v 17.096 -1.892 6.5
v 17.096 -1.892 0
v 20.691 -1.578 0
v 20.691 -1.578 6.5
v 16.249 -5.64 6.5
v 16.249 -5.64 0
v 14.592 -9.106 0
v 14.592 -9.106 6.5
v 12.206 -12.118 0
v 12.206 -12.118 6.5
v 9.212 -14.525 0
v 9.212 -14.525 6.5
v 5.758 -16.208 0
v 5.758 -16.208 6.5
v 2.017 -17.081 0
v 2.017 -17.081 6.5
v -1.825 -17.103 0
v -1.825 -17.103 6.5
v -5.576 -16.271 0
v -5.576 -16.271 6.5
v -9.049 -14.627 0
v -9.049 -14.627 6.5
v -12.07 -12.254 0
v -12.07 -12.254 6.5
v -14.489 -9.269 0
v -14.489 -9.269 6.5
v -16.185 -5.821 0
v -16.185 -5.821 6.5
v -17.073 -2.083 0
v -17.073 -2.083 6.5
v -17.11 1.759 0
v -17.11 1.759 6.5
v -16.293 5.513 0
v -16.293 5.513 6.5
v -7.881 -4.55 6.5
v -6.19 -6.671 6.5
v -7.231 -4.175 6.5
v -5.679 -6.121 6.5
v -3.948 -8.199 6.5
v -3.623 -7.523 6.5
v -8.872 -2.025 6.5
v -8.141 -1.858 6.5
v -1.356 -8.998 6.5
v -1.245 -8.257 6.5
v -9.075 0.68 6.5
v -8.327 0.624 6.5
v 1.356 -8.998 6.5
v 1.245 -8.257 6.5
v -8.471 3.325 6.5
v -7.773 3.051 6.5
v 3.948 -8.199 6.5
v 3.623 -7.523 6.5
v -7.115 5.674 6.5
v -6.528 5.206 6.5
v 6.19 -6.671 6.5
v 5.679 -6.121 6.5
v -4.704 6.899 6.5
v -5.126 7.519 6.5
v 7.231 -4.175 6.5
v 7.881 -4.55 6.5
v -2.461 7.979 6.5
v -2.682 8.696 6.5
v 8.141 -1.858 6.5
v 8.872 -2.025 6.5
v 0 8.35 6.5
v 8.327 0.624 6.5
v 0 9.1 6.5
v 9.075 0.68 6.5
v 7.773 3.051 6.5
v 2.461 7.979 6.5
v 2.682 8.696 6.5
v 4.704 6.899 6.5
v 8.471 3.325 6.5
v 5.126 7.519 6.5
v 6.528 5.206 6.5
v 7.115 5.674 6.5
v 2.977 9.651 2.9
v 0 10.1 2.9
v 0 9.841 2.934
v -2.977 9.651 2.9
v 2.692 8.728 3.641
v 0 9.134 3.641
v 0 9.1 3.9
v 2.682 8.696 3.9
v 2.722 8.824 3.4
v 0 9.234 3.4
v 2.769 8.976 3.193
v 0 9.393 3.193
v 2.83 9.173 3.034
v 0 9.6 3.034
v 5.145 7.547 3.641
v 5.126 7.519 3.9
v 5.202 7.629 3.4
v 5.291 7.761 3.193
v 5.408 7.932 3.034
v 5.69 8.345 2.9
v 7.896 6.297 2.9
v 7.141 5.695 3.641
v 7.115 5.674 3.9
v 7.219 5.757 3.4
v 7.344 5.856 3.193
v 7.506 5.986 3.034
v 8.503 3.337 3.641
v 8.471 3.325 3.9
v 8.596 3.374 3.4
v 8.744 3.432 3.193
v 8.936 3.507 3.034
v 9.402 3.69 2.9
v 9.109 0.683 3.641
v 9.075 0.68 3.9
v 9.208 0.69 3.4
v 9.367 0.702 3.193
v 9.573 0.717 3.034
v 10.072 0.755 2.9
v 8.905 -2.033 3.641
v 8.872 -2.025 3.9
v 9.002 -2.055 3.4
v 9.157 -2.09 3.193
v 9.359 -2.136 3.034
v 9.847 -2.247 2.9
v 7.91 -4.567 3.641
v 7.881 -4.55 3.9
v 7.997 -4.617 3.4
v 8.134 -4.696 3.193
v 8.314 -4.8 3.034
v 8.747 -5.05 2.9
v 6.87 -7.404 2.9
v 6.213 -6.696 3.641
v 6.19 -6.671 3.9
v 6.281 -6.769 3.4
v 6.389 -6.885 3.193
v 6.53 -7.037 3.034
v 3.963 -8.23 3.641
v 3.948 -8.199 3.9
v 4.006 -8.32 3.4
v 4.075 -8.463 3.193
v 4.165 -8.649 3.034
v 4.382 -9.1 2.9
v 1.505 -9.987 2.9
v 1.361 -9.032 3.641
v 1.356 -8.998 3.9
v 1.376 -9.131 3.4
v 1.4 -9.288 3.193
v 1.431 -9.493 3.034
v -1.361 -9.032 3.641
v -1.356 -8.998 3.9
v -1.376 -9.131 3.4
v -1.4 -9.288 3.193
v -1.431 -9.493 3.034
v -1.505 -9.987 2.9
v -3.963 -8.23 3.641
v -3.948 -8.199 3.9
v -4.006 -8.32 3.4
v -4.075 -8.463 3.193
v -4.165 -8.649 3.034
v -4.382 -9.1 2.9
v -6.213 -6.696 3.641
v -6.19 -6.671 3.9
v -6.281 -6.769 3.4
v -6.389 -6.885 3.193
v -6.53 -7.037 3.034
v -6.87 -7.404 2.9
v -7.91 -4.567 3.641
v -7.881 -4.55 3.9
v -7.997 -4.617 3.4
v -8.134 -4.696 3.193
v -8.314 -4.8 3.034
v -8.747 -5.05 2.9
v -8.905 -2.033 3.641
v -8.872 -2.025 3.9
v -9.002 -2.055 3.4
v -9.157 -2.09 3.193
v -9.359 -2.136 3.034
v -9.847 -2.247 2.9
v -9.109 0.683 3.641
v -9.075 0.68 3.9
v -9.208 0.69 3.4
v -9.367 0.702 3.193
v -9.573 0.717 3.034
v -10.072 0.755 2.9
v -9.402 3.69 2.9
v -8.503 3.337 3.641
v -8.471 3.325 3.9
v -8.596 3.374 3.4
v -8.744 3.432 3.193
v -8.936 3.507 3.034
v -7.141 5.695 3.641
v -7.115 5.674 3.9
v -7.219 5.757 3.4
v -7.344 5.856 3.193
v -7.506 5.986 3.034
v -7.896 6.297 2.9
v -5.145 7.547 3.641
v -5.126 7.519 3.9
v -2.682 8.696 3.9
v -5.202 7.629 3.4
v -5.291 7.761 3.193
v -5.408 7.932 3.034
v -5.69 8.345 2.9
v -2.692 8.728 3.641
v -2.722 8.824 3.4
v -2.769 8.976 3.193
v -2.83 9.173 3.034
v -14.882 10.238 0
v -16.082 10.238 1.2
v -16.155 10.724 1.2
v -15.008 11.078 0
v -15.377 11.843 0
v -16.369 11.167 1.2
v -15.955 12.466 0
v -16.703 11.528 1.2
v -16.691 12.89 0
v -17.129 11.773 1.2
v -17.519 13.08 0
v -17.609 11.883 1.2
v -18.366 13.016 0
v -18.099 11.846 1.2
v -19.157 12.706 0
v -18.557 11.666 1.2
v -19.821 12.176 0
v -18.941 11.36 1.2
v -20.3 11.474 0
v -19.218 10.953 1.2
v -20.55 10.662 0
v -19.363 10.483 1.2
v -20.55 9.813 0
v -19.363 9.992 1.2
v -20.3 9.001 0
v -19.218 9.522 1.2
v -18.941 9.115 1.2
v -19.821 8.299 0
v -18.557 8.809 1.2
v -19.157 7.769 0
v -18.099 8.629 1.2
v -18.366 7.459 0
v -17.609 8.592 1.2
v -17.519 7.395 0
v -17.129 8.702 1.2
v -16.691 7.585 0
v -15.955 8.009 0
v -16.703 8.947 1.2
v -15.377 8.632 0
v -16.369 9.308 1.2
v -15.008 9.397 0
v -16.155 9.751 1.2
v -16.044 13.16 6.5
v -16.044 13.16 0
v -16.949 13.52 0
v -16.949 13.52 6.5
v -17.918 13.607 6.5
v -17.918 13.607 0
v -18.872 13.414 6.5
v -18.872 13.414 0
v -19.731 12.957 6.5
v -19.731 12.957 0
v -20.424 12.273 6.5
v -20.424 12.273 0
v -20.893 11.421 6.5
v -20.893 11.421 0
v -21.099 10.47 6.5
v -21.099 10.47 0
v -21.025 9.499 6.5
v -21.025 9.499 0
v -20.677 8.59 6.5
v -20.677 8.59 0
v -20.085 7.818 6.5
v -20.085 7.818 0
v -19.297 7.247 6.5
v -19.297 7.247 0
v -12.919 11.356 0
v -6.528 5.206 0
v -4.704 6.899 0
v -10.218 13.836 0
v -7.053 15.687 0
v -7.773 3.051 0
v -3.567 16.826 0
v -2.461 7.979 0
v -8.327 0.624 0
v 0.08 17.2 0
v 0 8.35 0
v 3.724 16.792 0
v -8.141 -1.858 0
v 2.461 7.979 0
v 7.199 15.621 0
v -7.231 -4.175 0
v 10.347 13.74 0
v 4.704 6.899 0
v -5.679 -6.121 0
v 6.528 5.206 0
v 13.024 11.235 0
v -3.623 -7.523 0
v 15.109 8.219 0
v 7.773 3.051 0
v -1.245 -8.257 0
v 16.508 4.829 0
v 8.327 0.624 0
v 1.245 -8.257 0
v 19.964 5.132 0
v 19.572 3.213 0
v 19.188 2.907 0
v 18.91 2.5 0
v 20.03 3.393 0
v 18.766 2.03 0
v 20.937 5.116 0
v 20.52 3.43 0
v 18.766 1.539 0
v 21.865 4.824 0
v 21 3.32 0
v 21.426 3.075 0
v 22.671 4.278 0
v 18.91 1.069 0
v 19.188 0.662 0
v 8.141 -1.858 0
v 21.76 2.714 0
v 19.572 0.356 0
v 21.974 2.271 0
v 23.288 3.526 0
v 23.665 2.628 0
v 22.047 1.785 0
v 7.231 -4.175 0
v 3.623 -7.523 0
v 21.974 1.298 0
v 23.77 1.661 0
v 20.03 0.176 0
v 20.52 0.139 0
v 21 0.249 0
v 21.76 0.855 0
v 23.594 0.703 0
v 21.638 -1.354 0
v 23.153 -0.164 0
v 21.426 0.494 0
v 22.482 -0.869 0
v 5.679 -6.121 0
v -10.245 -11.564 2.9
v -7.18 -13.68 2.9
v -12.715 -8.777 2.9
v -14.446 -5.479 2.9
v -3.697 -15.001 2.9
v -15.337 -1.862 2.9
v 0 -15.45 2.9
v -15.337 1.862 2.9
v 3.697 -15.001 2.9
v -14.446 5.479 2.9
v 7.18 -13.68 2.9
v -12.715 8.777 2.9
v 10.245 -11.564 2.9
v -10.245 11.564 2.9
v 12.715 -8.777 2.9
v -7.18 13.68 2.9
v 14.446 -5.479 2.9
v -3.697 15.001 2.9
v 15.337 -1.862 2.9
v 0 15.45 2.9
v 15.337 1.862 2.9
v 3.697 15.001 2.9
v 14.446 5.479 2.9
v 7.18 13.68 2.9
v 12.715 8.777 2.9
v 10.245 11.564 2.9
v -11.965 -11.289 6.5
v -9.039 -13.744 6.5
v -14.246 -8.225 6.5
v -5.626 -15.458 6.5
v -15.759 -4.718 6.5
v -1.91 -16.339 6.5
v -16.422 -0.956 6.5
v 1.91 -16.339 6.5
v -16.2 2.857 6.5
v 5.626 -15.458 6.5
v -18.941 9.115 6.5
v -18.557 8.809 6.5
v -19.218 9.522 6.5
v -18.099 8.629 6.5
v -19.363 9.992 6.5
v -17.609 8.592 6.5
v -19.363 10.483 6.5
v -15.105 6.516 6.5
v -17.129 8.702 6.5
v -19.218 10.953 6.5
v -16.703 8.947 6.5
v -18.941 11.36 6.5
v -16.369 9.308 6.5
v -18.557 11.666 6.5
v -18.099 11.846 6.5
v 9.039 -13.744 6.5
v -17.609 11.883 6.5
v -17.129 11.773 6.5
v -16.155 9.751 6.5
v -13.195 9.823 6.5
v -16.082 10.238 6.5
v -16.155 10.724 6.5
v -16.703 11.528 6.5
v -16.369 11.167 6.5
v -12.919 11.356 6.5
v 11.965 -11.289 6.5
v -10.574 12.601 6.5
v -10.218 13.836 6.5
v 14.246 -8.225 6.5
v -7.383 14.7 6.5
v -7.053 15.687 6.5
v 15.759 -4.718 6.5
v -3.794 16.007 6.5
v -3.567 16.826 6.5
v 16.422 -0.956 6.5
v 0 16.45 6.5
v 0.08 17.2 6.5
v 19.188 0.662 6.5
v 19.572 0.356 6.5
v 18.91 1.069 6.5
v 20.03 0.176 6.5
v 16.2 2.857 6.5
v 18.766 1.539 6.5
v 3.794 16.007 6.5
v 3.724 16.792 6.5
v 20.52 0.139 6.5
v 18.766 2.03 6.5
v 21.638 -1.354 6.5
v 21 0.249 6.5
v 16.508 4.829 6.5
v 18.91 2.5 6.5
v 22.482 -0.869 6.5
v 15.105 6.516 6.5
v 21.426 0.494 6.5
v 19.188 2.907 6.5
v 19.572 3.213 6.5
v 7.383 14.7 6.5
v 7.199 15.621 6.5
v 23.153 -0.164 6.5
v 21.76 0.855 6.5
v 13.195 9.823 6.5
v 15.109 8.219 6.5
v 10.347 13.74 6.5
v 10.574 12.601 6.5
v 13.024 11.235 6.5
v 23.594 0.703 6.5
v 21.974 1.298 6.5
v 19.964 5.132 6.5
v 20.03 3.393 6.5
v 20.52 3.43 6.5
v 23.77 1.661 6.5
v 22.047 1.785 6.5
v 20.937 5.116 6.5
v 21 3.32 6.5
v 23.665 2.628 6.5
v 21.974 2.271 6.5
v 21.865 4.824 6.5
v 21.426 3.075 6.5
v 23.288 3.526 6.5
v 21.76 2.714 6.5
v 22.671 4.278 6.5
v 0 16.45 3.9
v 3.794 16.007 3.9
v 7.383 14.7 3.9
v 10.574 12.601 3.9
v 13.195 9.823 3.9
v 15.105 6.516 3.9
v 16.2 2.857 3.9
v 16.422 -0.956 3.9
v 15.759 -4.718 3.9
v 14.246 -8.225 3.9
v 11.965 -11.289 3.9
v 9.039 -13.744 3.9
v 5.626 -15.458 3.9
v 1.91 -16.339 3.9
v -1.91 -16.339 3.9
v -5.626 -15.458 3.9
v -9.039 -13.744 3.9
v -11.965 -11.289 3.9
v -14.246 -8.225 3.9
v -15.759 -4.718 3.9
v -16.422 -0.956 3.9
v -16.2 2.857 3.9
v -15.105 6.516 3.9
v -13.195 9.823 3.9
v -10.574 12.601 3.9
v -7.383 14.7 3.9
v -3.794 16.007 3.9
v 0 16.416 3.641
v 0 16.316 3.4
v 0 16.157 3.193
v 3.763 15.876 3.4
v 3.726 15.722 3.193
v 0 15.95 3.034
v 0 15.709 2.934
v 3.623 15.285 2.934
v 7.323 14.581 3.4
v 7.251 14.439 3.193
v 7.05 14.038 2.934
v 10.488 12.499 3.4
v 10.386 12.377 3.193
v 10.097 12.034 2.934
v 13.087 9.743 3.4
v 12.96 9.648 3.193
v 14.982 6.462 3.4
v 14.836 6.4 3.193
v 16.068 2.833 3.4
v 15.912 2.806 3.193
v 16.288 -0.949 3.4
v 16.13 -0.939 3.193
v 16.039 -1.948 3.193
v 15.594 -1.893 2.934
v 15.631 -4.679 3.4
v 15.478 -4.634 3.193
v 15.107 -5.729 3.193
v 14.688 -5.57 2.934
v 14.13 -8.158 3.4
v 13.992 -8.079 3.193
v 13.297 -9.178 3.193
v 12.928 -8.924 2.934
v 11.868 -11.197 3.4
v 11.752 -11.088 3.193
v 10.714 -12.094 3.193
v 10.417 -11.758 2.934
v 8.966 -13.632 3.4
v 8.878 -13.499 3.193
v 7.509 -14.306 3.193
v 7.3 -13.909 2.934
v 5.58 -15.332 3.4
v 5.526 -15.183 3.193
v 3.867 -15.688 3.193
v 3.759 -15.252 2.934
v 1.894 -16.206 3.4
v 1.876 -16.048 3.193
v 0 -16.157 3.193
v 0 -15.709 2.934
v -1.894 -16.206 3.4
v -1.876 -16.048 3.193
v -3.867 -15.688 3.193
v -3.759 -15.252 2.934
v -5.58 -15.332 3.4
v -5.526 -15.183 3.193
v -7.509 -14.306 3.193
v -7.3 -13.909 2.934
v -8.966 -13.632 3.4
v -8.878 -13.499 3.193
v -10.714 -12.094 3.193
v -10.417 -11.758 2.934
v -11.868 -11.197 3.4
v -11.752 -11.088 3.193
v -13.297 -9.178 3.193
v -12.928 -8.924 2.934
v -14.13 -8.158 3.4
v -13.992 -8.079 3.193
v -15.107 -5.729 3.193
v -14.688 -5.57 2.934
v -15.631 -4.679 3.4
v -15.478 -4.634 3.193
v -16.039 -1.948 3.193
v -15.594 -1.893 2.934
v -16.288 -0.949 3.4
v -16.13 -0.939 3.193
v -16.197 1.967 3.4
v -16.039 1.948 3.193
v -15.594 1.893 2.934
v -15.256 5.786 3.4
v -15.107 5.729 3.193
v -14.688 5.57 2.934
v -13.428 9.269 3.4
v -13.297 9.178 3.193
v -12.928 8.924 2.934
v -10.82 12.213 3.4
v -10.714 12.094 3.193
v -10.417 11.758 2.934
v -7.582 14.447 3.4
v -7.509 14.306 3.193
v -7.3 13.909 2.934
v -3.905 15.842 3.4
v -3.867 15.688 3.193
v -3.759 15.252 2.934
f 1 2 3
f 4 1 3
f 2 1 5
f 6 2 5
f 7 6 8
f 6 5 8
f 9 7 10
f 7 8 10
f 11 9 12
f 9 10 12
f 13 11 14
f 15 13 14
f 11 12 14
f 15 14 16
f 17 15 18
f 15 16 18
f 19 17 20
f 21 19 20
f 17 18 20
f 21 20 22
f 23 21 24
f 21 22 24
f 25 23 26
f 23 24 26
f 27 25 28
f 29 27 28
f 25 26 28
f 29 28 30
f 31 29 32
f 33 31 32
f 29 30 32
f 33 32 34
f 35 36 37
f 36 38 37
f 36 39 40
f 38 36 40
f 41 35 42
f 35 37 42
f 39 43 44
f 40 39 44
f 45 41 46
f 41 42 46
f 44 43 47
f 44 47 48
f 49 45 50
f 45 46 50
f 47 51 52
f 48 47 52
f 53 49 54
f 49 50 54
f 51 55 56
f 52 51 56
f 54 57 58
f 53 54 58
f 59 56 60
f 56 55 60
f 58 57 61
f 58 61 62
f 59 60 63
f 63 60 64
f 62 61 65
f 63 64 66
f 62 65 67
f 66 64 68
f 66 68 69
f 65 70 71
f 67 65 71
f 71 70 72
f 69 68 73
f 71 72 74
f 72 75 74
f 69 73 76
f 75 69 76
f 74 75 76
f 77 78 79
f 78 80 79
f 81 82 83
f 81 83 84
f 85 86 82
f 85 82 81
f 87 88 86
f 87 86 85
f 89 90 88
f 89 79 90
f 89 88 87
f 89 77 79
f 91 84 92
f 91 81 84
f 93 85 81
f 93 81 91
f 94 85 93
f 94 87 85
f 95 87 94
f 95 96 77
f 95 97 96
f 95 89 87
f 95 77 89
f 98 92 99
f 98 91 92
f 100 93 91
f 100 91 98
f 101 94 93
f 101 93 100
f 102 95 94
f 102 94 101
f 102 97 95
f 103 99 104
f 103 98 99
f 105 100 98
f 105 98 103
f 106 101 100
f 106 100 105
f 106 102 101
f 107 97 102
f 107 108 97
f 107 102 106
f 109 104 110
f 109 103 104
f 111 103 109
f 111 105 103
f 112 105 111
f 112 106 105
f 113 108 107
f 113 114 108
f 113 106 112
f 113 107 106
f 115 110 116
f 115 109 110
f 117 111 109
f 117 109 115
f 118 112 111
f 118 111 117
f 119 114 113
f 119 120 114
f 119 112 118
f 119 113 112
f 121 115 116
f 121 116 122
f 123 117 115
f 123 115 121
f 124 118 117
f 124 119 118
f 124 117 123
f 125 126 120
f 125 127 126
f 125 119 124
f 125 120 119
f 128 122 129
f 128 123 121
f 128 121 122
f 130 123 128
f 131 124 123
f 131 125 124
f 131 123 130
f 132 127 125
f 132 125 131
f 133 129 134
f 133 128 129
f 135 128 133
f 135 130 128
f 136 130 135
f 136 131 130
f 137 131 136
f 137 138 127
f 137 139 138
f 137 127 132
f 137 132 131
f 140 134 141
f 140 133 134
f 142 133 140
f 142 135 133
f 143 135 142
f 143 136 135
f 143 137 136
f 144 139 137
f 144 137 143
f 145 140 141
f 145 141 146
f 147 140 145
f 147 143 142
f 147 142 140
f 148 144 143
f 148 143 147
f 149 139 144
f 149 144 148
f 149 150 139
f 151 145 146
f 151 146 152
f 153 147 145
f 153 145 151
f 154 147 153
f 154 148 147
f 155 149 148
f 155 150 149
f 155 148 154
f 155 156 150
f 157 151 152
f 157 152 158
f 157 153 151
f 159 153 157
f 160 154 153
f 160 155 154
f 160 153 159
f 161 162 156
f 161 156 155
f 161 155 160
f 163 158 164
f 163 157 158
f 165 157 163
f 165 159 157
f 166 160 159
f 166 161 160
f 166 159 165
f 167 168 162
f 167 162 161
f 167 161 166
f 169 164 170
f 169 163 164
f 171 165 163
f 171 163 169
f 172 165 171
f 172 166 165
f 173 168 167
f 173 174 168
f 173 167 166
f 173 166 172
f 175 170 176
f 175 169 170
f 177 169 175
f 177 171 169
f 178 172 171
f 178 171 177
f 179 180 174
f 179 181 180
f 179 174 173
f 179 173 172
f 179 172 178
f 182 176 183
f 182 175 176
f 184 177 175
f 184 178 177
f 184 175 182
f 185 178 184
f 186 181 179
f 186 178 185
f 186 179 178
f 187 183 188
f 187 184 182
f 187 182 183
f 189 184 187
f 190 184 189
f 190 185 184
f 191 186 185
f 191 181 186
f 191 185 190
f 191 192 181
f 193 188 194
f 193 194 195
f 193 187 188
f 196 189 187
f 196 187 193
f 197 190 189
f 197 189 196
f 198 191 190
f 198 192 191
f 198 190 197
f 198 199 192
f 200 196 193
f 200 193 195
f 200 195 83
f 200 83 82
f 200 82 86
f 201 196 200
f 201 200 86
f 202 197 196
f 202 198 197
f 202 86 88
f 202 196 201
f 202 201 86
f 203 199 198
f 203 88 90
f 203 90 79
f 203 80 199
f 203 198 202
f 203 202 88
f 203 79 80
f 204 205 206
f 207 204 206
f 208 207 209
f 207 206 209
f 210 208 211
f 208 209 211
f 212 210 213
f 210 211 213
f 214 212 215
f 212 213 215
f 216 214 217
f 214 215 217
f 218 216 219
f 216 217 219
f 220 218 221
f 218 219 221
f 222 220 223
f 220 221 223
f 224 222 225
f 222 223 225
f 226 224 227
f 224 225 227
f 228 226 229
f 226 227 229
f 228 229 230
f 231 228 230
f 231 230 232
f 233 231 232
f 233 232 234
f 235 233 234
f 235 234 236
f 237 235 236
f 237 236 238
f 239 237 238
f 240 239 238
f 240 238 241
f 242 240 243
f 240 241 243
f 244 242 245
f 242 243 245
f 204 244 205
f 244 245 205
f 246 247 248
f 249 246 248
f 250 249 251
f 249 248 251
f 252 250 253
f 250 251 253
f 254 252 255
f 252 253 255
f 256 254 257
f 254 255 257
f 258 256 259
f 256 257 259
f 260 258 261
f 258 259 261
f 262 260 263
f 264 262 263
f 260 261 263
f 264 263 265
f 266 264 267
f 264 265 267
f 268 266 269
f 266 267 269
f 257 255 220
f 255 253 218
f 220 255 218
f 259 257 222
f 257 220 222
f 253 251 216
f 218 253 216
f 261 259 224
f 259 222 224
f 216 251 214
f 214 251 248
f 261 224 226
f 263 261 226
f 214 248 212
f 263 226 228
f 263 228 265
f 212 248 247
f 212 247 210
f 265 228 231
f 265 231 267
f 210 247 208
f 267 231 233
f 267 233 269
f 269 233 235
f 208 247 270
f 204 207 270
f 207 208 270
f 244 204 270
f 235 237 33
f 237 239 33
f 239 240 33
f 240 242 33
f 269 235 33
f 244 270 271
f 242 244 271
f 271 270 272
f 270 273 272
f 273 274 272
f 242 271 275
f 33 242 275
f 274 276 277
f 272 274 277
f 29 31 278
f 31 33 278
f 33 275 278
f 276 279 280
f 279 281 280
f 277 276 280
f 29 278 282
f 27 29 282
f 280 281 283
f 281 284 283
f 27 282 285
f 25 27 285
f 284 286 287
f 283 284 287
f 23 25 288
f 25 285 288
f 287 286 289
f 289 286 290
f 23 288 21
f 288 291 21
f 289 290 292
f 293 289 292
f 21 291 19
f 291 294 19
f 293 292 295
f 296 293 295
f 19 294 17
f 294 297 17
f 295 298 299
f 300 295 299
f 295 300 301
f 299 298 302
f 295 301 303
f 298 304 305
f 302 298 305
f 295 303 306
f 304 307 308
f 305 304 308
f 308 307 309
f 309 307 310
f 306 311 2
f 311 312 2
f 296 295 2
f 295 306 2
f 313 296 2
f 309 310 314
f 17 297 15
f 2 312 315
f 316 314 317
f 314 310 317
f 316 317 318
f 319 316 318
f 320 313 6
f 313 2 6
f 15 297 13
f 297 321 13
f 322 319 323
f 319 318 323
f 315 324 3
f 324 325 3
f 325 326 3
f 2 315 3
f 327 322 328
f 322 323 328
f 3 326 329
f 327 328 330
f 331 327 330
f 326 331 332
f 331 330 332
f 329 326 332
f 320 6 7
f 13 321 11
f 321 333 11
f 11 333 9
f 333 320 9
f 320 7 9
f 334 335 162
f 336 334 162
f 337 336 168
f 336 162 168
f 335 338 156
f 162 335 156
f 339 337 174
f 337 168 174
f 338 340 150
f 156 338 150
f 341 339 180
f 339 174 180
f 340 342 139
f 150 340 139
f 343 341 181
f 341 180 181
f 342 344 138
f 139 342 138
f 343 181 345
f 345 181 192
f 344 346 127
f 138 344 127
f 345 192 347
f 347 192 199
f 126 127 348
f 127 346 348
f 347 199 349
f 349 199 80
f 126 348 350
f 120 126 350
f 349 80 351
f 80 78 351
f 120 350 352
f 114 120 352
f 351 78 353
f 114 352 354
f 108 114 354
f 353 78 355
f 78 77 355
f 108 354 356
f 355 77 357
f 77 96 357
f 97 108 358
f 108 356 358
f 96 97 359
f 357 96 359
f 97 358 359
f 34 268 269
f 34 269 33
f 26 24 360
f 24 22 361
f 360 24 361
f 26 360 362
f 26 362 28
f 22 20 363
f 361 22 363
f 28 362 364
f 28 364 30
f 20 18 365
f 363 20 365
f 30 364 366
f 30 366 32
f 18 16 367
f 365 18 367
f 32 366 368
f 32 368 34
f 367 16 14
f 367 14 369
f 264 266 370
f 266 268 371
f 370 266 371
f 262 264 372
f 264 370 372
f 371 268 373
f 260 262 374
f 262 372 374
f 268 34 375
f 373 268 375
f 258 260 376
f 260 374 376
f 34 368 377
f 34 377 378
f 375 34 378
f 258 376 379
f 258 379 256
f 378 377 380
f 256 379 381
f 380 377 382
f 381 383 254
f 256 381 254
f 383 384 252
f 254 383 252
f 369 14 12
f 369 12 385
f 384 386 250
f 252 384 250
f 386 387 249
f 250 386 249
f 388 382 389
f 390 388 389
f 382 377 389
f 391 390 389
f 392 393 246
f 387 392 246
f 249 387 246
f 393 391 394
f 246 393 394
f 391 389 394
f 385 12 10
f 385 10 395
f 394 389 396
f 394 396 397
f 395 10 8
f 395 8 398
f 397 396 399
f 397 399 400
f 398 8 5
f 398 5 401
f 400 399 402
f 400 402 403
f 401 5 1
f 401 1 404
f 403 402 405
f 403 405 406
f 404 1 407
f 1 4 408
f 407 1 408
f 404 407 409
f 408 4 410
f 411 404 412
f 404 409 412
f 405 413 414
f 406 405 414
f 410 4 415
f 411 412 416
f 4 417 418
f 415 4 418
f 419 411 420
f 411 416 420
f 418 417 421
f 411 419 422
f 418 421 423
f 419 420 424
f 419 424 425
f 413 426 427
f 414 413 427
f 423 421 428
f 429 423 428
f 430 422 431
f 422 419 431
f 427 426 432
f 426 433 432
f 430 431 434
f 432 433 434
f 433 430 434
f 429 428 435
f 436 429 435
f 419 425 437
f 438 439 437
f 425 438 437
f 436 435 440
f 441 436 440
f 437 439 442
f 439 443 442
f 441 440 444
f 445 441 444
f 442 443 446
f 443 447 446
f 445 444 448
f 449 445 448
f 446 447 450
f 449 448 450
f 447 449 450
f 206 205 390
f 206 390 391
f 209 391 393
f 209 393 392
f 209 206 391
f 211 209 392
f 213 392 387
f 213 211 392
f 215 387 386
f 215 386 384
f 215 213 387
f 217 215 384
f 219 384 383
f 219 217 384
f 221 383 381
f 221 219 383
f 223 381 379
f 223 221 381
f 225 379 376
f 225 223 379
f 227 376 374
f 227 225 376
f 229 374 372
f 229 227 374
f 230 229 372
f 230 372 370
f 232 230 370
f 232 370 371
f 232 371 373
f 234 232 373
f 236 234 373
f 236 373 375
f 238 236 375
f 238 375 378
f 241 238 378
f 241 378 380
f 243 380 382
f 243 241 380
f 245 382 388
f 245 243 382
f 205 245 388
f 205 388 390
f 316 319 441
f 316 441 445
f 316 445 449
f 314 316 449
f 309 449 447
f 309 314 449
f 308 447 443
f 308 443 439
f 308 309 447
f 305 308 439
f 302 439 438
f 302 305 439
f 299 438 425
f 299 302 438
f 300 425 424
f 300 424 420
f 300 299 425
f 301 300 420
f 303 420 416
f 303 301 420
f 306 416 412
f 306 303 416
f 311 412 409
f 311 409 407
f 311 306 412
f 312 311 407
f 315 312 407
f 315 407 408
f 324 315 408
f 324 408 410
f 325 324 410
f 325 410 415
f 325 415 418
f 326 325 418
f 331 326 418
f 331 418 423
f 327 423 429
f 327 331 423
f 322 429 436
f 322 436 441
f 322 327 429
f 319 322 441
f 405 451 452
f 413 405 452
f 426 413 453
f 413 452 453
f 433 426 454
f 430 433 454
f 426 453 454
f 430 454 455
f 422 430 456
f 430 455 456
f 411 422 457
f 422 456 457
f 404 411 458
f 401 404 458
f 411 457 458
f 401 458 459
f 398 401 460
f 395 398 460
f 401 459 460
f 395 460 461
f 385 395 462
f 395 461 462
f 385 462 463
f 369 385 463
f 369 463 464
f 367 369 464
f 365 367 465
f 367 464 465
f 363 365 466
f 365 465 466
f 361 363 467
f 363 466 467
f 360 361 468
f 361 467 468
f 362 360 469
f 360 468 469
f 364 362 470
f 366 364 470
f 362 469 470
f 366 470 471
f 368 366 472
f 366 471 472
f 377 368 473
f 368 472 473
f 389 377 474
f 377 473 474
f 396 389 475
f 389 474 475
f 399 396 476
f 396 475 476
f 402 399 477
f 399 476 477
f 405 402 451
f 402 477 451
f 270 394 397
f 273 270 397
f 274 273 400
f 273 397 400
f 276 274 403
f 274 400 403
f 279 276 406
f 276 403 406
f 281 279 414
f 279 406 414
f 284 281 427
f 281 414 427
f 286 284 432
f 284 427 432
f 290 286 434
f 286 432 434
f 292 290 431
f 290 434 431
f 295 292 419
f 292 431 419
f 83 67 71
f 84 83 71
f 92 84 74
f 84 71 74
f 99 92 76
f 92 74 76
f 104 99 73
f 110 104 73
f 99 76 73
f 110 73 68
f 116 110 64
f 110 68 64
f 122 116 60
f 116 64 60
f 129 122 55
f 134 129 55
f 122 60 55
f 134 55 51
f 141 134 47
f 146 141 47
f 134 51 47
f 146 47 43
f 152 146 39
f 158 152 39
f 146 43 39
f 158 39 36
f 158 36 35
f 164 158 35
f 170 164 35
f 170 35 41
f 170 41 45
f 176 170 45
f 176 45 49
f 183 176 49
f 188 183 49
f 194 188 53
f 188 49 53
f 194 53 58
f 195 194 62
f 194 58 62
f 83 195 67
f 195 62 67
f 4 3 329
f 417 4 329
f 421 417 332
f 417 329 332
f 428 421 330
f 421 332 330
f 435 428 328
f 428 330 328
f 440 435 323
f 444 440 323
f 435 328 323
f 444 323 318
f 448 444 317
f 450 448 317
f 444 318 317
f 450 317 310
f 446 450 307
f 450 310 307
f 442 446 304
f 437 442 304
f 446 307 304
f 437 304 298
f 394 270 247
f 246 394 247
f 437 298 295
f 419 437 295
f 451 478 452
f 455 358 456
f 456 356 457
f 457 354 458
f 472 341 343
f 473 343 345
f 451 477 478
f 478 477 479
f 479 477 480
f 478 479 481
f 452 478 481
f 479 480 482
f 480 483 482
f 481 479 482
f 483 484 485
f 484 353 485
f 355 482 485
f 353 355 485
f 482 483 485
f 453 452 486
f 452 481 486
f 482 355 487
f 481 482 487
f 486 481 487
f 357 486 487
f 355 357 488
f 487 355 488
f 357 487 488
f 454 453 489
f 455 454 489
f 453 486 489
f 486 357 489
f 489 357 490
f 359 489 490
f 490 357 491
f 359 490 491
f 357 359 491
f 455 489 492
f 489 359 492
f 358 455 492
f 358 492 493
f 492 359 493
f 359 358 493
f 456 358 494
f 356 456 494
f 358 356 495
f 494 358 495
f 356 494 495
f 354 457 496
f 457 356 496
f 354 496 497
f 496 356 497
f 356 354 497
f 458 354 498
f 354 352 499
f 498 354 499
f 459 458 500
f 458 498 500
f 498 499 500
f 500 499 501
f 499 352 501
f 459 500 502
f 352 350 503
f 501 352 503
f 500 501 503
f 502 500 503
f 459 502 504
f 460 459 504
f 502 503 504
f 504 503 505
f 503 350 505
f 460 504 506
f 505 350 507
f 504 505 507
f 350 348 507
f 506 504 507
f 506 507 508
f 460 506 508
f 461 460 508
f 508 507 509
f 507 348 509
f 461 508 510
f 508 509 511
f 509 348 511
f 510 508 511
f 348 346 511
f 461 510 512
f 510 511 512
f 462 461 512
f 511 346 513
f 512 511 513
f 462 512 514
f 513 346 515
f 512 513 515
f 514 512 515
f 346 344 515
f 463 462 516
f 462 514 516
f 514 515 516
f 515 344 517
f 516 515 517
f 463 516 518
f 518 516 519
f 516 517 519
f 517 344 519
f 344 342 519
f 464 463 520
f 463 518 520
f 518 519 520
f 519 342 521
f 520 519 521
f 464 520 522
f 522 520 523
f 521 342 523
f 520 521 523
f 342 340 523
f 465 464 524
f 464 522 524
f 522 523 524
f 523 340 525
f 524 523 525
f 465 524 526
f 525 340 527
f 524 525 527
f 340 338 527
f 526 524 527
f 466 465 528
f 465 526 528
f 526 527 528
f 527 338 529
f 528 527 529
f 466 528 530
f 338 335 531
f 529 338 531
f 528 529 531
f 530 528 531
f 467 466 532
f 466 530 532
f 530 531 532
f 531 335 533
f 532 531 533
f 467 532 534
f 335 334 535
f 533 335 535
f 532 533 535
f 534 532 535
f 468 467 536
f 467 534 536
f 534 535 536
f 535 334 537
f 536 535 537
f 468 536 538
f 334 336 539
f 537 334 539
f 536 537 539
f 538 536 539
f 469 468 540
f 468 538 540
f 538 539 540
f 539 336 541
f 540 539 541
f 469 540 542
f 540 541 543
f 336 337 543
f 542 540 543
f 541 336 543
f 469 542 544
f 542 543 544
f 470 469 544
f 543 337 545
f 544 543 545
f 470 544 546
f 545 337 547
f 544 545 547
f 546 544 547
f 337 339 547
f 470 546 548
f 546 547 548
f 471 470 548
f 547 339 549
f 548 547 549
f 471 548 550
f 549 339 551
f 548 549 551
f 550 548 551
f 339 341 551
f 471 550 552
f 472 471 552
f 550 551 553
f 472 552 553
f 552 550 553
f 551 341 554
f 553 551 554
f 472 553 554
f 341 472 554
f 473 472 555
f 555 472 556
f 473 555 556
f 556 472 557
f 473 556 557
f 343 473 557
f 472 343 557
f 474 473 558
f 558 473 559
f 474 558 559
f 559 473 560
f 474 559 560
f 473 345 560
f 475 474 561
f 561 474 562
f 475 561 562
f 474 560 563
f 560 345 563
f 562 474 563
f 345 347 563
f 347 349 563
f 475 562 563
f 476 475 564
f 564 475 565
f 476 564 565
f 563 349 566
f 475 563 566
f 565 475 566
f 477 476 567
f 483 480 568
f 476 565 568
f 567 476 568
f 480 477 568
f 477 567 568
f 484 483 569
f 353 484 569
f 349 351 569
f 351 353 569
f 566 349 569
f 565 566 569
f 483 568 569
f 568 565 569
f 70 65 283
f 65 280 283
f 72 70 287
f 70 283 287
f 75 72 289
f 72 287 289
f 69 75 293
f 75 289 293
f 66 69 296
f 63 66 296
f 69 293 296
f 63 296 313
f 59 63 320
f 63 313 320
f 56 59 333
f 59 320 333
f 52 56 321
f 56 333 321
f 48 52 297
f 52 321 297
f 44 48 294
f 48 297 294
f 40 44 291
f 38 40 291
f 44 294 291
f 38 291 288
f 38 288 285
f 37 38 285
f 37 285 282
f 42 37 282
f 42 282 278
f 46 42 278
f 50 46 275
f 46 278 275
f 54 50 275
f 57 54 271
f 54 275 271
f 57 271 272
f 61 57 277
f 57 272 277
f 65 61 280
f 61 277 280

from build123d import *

# Parameters (mm, degrees)
F2_R     = 1.65
F3_DEPTH = 6.5
F4_SIZE  = 1.2
F5_R     = 1


# Not quite as in the source:
# - a feature names something its author has since deleted; it is built from what else it names


with BuildPart() as f1:
    # F0 (on Right) → F1 (revolve)
    with BuildSketch(Plane.YZ):
        Polygon((8.35, 0), (17.2, 0), (17.2, 6.5), (16.45, 6.5), (16.45, 2.9), (9.1, 2.9), (9.1, 6.5), (8.35, 6.5), align=None)
    revolve(axis=Axis((0, 0, -2.445915569), (0, 0, -1)))

    # F2 (on Top) → F3 (join, through all)
    with BuildSketch(Plane.XY):
        with BuildLine():
            Line((-12.9185614558, 11.3556492511), (-16.0443701425, 13.1603357378))
            ThreePointArc((-16.0443701425, 13.1603357378), (-20.6890755738, 11.8640180715), (-19.2967065825, 7.2471970193))
            Line((-19.2967065825, 7.2471970193), (-16.2926126828, 5.5127825977))
            ThreePointArc((-16.2926126828, 5.5127825977), (-14.8948966536, 8.6012820951), (-12.9185614558, 11.3556492511))
        make_face()
        with Locations((-17.7318701425, 10.2375)):
            Circle(F2_R, mode=Mode.SUBTRACT)
        with BuildLine():
            ThreePointArc((16.5081291827, 4.8292515868), (17.1346777754, 1.4976039307), (17.0955988557, -1.8922208557))
            Line((17.0955988557, -1.8922208557), (20.6912370752, -1.5776432733))
            ThreePointArc((20.6912370752, -1.5776432733), (23.752419757, 2.1483315823), (19.9637580849, 5.1315799411))
            Line((19.9637580849, 5.1315799411), (16.5081291827, 4.8292515868))
        make_face()
        with Locations((20.3970864434, 1.7845138328)):
            Circle(F2_R, mode=Mode.SUBTRACT)
    extrude(amount=F3_DEPTH)

    # F4
    f4_edges = [f1.edges().sort_by_distance(p)[0] for p in [
        (-19.38187, 10.2375, 0),
    ]]
    chamfer(f4_edges, length=F4_SIZE)

    # F5
    f5_edges = [f1.edges().sort_by_distance(p)[0] for p in [
        (0, -16.45, 2.9),
        (0, -9.1, 2.9),
    ]]
    fillet(f5_edges, radius=F5_R)


solid = f1.part
